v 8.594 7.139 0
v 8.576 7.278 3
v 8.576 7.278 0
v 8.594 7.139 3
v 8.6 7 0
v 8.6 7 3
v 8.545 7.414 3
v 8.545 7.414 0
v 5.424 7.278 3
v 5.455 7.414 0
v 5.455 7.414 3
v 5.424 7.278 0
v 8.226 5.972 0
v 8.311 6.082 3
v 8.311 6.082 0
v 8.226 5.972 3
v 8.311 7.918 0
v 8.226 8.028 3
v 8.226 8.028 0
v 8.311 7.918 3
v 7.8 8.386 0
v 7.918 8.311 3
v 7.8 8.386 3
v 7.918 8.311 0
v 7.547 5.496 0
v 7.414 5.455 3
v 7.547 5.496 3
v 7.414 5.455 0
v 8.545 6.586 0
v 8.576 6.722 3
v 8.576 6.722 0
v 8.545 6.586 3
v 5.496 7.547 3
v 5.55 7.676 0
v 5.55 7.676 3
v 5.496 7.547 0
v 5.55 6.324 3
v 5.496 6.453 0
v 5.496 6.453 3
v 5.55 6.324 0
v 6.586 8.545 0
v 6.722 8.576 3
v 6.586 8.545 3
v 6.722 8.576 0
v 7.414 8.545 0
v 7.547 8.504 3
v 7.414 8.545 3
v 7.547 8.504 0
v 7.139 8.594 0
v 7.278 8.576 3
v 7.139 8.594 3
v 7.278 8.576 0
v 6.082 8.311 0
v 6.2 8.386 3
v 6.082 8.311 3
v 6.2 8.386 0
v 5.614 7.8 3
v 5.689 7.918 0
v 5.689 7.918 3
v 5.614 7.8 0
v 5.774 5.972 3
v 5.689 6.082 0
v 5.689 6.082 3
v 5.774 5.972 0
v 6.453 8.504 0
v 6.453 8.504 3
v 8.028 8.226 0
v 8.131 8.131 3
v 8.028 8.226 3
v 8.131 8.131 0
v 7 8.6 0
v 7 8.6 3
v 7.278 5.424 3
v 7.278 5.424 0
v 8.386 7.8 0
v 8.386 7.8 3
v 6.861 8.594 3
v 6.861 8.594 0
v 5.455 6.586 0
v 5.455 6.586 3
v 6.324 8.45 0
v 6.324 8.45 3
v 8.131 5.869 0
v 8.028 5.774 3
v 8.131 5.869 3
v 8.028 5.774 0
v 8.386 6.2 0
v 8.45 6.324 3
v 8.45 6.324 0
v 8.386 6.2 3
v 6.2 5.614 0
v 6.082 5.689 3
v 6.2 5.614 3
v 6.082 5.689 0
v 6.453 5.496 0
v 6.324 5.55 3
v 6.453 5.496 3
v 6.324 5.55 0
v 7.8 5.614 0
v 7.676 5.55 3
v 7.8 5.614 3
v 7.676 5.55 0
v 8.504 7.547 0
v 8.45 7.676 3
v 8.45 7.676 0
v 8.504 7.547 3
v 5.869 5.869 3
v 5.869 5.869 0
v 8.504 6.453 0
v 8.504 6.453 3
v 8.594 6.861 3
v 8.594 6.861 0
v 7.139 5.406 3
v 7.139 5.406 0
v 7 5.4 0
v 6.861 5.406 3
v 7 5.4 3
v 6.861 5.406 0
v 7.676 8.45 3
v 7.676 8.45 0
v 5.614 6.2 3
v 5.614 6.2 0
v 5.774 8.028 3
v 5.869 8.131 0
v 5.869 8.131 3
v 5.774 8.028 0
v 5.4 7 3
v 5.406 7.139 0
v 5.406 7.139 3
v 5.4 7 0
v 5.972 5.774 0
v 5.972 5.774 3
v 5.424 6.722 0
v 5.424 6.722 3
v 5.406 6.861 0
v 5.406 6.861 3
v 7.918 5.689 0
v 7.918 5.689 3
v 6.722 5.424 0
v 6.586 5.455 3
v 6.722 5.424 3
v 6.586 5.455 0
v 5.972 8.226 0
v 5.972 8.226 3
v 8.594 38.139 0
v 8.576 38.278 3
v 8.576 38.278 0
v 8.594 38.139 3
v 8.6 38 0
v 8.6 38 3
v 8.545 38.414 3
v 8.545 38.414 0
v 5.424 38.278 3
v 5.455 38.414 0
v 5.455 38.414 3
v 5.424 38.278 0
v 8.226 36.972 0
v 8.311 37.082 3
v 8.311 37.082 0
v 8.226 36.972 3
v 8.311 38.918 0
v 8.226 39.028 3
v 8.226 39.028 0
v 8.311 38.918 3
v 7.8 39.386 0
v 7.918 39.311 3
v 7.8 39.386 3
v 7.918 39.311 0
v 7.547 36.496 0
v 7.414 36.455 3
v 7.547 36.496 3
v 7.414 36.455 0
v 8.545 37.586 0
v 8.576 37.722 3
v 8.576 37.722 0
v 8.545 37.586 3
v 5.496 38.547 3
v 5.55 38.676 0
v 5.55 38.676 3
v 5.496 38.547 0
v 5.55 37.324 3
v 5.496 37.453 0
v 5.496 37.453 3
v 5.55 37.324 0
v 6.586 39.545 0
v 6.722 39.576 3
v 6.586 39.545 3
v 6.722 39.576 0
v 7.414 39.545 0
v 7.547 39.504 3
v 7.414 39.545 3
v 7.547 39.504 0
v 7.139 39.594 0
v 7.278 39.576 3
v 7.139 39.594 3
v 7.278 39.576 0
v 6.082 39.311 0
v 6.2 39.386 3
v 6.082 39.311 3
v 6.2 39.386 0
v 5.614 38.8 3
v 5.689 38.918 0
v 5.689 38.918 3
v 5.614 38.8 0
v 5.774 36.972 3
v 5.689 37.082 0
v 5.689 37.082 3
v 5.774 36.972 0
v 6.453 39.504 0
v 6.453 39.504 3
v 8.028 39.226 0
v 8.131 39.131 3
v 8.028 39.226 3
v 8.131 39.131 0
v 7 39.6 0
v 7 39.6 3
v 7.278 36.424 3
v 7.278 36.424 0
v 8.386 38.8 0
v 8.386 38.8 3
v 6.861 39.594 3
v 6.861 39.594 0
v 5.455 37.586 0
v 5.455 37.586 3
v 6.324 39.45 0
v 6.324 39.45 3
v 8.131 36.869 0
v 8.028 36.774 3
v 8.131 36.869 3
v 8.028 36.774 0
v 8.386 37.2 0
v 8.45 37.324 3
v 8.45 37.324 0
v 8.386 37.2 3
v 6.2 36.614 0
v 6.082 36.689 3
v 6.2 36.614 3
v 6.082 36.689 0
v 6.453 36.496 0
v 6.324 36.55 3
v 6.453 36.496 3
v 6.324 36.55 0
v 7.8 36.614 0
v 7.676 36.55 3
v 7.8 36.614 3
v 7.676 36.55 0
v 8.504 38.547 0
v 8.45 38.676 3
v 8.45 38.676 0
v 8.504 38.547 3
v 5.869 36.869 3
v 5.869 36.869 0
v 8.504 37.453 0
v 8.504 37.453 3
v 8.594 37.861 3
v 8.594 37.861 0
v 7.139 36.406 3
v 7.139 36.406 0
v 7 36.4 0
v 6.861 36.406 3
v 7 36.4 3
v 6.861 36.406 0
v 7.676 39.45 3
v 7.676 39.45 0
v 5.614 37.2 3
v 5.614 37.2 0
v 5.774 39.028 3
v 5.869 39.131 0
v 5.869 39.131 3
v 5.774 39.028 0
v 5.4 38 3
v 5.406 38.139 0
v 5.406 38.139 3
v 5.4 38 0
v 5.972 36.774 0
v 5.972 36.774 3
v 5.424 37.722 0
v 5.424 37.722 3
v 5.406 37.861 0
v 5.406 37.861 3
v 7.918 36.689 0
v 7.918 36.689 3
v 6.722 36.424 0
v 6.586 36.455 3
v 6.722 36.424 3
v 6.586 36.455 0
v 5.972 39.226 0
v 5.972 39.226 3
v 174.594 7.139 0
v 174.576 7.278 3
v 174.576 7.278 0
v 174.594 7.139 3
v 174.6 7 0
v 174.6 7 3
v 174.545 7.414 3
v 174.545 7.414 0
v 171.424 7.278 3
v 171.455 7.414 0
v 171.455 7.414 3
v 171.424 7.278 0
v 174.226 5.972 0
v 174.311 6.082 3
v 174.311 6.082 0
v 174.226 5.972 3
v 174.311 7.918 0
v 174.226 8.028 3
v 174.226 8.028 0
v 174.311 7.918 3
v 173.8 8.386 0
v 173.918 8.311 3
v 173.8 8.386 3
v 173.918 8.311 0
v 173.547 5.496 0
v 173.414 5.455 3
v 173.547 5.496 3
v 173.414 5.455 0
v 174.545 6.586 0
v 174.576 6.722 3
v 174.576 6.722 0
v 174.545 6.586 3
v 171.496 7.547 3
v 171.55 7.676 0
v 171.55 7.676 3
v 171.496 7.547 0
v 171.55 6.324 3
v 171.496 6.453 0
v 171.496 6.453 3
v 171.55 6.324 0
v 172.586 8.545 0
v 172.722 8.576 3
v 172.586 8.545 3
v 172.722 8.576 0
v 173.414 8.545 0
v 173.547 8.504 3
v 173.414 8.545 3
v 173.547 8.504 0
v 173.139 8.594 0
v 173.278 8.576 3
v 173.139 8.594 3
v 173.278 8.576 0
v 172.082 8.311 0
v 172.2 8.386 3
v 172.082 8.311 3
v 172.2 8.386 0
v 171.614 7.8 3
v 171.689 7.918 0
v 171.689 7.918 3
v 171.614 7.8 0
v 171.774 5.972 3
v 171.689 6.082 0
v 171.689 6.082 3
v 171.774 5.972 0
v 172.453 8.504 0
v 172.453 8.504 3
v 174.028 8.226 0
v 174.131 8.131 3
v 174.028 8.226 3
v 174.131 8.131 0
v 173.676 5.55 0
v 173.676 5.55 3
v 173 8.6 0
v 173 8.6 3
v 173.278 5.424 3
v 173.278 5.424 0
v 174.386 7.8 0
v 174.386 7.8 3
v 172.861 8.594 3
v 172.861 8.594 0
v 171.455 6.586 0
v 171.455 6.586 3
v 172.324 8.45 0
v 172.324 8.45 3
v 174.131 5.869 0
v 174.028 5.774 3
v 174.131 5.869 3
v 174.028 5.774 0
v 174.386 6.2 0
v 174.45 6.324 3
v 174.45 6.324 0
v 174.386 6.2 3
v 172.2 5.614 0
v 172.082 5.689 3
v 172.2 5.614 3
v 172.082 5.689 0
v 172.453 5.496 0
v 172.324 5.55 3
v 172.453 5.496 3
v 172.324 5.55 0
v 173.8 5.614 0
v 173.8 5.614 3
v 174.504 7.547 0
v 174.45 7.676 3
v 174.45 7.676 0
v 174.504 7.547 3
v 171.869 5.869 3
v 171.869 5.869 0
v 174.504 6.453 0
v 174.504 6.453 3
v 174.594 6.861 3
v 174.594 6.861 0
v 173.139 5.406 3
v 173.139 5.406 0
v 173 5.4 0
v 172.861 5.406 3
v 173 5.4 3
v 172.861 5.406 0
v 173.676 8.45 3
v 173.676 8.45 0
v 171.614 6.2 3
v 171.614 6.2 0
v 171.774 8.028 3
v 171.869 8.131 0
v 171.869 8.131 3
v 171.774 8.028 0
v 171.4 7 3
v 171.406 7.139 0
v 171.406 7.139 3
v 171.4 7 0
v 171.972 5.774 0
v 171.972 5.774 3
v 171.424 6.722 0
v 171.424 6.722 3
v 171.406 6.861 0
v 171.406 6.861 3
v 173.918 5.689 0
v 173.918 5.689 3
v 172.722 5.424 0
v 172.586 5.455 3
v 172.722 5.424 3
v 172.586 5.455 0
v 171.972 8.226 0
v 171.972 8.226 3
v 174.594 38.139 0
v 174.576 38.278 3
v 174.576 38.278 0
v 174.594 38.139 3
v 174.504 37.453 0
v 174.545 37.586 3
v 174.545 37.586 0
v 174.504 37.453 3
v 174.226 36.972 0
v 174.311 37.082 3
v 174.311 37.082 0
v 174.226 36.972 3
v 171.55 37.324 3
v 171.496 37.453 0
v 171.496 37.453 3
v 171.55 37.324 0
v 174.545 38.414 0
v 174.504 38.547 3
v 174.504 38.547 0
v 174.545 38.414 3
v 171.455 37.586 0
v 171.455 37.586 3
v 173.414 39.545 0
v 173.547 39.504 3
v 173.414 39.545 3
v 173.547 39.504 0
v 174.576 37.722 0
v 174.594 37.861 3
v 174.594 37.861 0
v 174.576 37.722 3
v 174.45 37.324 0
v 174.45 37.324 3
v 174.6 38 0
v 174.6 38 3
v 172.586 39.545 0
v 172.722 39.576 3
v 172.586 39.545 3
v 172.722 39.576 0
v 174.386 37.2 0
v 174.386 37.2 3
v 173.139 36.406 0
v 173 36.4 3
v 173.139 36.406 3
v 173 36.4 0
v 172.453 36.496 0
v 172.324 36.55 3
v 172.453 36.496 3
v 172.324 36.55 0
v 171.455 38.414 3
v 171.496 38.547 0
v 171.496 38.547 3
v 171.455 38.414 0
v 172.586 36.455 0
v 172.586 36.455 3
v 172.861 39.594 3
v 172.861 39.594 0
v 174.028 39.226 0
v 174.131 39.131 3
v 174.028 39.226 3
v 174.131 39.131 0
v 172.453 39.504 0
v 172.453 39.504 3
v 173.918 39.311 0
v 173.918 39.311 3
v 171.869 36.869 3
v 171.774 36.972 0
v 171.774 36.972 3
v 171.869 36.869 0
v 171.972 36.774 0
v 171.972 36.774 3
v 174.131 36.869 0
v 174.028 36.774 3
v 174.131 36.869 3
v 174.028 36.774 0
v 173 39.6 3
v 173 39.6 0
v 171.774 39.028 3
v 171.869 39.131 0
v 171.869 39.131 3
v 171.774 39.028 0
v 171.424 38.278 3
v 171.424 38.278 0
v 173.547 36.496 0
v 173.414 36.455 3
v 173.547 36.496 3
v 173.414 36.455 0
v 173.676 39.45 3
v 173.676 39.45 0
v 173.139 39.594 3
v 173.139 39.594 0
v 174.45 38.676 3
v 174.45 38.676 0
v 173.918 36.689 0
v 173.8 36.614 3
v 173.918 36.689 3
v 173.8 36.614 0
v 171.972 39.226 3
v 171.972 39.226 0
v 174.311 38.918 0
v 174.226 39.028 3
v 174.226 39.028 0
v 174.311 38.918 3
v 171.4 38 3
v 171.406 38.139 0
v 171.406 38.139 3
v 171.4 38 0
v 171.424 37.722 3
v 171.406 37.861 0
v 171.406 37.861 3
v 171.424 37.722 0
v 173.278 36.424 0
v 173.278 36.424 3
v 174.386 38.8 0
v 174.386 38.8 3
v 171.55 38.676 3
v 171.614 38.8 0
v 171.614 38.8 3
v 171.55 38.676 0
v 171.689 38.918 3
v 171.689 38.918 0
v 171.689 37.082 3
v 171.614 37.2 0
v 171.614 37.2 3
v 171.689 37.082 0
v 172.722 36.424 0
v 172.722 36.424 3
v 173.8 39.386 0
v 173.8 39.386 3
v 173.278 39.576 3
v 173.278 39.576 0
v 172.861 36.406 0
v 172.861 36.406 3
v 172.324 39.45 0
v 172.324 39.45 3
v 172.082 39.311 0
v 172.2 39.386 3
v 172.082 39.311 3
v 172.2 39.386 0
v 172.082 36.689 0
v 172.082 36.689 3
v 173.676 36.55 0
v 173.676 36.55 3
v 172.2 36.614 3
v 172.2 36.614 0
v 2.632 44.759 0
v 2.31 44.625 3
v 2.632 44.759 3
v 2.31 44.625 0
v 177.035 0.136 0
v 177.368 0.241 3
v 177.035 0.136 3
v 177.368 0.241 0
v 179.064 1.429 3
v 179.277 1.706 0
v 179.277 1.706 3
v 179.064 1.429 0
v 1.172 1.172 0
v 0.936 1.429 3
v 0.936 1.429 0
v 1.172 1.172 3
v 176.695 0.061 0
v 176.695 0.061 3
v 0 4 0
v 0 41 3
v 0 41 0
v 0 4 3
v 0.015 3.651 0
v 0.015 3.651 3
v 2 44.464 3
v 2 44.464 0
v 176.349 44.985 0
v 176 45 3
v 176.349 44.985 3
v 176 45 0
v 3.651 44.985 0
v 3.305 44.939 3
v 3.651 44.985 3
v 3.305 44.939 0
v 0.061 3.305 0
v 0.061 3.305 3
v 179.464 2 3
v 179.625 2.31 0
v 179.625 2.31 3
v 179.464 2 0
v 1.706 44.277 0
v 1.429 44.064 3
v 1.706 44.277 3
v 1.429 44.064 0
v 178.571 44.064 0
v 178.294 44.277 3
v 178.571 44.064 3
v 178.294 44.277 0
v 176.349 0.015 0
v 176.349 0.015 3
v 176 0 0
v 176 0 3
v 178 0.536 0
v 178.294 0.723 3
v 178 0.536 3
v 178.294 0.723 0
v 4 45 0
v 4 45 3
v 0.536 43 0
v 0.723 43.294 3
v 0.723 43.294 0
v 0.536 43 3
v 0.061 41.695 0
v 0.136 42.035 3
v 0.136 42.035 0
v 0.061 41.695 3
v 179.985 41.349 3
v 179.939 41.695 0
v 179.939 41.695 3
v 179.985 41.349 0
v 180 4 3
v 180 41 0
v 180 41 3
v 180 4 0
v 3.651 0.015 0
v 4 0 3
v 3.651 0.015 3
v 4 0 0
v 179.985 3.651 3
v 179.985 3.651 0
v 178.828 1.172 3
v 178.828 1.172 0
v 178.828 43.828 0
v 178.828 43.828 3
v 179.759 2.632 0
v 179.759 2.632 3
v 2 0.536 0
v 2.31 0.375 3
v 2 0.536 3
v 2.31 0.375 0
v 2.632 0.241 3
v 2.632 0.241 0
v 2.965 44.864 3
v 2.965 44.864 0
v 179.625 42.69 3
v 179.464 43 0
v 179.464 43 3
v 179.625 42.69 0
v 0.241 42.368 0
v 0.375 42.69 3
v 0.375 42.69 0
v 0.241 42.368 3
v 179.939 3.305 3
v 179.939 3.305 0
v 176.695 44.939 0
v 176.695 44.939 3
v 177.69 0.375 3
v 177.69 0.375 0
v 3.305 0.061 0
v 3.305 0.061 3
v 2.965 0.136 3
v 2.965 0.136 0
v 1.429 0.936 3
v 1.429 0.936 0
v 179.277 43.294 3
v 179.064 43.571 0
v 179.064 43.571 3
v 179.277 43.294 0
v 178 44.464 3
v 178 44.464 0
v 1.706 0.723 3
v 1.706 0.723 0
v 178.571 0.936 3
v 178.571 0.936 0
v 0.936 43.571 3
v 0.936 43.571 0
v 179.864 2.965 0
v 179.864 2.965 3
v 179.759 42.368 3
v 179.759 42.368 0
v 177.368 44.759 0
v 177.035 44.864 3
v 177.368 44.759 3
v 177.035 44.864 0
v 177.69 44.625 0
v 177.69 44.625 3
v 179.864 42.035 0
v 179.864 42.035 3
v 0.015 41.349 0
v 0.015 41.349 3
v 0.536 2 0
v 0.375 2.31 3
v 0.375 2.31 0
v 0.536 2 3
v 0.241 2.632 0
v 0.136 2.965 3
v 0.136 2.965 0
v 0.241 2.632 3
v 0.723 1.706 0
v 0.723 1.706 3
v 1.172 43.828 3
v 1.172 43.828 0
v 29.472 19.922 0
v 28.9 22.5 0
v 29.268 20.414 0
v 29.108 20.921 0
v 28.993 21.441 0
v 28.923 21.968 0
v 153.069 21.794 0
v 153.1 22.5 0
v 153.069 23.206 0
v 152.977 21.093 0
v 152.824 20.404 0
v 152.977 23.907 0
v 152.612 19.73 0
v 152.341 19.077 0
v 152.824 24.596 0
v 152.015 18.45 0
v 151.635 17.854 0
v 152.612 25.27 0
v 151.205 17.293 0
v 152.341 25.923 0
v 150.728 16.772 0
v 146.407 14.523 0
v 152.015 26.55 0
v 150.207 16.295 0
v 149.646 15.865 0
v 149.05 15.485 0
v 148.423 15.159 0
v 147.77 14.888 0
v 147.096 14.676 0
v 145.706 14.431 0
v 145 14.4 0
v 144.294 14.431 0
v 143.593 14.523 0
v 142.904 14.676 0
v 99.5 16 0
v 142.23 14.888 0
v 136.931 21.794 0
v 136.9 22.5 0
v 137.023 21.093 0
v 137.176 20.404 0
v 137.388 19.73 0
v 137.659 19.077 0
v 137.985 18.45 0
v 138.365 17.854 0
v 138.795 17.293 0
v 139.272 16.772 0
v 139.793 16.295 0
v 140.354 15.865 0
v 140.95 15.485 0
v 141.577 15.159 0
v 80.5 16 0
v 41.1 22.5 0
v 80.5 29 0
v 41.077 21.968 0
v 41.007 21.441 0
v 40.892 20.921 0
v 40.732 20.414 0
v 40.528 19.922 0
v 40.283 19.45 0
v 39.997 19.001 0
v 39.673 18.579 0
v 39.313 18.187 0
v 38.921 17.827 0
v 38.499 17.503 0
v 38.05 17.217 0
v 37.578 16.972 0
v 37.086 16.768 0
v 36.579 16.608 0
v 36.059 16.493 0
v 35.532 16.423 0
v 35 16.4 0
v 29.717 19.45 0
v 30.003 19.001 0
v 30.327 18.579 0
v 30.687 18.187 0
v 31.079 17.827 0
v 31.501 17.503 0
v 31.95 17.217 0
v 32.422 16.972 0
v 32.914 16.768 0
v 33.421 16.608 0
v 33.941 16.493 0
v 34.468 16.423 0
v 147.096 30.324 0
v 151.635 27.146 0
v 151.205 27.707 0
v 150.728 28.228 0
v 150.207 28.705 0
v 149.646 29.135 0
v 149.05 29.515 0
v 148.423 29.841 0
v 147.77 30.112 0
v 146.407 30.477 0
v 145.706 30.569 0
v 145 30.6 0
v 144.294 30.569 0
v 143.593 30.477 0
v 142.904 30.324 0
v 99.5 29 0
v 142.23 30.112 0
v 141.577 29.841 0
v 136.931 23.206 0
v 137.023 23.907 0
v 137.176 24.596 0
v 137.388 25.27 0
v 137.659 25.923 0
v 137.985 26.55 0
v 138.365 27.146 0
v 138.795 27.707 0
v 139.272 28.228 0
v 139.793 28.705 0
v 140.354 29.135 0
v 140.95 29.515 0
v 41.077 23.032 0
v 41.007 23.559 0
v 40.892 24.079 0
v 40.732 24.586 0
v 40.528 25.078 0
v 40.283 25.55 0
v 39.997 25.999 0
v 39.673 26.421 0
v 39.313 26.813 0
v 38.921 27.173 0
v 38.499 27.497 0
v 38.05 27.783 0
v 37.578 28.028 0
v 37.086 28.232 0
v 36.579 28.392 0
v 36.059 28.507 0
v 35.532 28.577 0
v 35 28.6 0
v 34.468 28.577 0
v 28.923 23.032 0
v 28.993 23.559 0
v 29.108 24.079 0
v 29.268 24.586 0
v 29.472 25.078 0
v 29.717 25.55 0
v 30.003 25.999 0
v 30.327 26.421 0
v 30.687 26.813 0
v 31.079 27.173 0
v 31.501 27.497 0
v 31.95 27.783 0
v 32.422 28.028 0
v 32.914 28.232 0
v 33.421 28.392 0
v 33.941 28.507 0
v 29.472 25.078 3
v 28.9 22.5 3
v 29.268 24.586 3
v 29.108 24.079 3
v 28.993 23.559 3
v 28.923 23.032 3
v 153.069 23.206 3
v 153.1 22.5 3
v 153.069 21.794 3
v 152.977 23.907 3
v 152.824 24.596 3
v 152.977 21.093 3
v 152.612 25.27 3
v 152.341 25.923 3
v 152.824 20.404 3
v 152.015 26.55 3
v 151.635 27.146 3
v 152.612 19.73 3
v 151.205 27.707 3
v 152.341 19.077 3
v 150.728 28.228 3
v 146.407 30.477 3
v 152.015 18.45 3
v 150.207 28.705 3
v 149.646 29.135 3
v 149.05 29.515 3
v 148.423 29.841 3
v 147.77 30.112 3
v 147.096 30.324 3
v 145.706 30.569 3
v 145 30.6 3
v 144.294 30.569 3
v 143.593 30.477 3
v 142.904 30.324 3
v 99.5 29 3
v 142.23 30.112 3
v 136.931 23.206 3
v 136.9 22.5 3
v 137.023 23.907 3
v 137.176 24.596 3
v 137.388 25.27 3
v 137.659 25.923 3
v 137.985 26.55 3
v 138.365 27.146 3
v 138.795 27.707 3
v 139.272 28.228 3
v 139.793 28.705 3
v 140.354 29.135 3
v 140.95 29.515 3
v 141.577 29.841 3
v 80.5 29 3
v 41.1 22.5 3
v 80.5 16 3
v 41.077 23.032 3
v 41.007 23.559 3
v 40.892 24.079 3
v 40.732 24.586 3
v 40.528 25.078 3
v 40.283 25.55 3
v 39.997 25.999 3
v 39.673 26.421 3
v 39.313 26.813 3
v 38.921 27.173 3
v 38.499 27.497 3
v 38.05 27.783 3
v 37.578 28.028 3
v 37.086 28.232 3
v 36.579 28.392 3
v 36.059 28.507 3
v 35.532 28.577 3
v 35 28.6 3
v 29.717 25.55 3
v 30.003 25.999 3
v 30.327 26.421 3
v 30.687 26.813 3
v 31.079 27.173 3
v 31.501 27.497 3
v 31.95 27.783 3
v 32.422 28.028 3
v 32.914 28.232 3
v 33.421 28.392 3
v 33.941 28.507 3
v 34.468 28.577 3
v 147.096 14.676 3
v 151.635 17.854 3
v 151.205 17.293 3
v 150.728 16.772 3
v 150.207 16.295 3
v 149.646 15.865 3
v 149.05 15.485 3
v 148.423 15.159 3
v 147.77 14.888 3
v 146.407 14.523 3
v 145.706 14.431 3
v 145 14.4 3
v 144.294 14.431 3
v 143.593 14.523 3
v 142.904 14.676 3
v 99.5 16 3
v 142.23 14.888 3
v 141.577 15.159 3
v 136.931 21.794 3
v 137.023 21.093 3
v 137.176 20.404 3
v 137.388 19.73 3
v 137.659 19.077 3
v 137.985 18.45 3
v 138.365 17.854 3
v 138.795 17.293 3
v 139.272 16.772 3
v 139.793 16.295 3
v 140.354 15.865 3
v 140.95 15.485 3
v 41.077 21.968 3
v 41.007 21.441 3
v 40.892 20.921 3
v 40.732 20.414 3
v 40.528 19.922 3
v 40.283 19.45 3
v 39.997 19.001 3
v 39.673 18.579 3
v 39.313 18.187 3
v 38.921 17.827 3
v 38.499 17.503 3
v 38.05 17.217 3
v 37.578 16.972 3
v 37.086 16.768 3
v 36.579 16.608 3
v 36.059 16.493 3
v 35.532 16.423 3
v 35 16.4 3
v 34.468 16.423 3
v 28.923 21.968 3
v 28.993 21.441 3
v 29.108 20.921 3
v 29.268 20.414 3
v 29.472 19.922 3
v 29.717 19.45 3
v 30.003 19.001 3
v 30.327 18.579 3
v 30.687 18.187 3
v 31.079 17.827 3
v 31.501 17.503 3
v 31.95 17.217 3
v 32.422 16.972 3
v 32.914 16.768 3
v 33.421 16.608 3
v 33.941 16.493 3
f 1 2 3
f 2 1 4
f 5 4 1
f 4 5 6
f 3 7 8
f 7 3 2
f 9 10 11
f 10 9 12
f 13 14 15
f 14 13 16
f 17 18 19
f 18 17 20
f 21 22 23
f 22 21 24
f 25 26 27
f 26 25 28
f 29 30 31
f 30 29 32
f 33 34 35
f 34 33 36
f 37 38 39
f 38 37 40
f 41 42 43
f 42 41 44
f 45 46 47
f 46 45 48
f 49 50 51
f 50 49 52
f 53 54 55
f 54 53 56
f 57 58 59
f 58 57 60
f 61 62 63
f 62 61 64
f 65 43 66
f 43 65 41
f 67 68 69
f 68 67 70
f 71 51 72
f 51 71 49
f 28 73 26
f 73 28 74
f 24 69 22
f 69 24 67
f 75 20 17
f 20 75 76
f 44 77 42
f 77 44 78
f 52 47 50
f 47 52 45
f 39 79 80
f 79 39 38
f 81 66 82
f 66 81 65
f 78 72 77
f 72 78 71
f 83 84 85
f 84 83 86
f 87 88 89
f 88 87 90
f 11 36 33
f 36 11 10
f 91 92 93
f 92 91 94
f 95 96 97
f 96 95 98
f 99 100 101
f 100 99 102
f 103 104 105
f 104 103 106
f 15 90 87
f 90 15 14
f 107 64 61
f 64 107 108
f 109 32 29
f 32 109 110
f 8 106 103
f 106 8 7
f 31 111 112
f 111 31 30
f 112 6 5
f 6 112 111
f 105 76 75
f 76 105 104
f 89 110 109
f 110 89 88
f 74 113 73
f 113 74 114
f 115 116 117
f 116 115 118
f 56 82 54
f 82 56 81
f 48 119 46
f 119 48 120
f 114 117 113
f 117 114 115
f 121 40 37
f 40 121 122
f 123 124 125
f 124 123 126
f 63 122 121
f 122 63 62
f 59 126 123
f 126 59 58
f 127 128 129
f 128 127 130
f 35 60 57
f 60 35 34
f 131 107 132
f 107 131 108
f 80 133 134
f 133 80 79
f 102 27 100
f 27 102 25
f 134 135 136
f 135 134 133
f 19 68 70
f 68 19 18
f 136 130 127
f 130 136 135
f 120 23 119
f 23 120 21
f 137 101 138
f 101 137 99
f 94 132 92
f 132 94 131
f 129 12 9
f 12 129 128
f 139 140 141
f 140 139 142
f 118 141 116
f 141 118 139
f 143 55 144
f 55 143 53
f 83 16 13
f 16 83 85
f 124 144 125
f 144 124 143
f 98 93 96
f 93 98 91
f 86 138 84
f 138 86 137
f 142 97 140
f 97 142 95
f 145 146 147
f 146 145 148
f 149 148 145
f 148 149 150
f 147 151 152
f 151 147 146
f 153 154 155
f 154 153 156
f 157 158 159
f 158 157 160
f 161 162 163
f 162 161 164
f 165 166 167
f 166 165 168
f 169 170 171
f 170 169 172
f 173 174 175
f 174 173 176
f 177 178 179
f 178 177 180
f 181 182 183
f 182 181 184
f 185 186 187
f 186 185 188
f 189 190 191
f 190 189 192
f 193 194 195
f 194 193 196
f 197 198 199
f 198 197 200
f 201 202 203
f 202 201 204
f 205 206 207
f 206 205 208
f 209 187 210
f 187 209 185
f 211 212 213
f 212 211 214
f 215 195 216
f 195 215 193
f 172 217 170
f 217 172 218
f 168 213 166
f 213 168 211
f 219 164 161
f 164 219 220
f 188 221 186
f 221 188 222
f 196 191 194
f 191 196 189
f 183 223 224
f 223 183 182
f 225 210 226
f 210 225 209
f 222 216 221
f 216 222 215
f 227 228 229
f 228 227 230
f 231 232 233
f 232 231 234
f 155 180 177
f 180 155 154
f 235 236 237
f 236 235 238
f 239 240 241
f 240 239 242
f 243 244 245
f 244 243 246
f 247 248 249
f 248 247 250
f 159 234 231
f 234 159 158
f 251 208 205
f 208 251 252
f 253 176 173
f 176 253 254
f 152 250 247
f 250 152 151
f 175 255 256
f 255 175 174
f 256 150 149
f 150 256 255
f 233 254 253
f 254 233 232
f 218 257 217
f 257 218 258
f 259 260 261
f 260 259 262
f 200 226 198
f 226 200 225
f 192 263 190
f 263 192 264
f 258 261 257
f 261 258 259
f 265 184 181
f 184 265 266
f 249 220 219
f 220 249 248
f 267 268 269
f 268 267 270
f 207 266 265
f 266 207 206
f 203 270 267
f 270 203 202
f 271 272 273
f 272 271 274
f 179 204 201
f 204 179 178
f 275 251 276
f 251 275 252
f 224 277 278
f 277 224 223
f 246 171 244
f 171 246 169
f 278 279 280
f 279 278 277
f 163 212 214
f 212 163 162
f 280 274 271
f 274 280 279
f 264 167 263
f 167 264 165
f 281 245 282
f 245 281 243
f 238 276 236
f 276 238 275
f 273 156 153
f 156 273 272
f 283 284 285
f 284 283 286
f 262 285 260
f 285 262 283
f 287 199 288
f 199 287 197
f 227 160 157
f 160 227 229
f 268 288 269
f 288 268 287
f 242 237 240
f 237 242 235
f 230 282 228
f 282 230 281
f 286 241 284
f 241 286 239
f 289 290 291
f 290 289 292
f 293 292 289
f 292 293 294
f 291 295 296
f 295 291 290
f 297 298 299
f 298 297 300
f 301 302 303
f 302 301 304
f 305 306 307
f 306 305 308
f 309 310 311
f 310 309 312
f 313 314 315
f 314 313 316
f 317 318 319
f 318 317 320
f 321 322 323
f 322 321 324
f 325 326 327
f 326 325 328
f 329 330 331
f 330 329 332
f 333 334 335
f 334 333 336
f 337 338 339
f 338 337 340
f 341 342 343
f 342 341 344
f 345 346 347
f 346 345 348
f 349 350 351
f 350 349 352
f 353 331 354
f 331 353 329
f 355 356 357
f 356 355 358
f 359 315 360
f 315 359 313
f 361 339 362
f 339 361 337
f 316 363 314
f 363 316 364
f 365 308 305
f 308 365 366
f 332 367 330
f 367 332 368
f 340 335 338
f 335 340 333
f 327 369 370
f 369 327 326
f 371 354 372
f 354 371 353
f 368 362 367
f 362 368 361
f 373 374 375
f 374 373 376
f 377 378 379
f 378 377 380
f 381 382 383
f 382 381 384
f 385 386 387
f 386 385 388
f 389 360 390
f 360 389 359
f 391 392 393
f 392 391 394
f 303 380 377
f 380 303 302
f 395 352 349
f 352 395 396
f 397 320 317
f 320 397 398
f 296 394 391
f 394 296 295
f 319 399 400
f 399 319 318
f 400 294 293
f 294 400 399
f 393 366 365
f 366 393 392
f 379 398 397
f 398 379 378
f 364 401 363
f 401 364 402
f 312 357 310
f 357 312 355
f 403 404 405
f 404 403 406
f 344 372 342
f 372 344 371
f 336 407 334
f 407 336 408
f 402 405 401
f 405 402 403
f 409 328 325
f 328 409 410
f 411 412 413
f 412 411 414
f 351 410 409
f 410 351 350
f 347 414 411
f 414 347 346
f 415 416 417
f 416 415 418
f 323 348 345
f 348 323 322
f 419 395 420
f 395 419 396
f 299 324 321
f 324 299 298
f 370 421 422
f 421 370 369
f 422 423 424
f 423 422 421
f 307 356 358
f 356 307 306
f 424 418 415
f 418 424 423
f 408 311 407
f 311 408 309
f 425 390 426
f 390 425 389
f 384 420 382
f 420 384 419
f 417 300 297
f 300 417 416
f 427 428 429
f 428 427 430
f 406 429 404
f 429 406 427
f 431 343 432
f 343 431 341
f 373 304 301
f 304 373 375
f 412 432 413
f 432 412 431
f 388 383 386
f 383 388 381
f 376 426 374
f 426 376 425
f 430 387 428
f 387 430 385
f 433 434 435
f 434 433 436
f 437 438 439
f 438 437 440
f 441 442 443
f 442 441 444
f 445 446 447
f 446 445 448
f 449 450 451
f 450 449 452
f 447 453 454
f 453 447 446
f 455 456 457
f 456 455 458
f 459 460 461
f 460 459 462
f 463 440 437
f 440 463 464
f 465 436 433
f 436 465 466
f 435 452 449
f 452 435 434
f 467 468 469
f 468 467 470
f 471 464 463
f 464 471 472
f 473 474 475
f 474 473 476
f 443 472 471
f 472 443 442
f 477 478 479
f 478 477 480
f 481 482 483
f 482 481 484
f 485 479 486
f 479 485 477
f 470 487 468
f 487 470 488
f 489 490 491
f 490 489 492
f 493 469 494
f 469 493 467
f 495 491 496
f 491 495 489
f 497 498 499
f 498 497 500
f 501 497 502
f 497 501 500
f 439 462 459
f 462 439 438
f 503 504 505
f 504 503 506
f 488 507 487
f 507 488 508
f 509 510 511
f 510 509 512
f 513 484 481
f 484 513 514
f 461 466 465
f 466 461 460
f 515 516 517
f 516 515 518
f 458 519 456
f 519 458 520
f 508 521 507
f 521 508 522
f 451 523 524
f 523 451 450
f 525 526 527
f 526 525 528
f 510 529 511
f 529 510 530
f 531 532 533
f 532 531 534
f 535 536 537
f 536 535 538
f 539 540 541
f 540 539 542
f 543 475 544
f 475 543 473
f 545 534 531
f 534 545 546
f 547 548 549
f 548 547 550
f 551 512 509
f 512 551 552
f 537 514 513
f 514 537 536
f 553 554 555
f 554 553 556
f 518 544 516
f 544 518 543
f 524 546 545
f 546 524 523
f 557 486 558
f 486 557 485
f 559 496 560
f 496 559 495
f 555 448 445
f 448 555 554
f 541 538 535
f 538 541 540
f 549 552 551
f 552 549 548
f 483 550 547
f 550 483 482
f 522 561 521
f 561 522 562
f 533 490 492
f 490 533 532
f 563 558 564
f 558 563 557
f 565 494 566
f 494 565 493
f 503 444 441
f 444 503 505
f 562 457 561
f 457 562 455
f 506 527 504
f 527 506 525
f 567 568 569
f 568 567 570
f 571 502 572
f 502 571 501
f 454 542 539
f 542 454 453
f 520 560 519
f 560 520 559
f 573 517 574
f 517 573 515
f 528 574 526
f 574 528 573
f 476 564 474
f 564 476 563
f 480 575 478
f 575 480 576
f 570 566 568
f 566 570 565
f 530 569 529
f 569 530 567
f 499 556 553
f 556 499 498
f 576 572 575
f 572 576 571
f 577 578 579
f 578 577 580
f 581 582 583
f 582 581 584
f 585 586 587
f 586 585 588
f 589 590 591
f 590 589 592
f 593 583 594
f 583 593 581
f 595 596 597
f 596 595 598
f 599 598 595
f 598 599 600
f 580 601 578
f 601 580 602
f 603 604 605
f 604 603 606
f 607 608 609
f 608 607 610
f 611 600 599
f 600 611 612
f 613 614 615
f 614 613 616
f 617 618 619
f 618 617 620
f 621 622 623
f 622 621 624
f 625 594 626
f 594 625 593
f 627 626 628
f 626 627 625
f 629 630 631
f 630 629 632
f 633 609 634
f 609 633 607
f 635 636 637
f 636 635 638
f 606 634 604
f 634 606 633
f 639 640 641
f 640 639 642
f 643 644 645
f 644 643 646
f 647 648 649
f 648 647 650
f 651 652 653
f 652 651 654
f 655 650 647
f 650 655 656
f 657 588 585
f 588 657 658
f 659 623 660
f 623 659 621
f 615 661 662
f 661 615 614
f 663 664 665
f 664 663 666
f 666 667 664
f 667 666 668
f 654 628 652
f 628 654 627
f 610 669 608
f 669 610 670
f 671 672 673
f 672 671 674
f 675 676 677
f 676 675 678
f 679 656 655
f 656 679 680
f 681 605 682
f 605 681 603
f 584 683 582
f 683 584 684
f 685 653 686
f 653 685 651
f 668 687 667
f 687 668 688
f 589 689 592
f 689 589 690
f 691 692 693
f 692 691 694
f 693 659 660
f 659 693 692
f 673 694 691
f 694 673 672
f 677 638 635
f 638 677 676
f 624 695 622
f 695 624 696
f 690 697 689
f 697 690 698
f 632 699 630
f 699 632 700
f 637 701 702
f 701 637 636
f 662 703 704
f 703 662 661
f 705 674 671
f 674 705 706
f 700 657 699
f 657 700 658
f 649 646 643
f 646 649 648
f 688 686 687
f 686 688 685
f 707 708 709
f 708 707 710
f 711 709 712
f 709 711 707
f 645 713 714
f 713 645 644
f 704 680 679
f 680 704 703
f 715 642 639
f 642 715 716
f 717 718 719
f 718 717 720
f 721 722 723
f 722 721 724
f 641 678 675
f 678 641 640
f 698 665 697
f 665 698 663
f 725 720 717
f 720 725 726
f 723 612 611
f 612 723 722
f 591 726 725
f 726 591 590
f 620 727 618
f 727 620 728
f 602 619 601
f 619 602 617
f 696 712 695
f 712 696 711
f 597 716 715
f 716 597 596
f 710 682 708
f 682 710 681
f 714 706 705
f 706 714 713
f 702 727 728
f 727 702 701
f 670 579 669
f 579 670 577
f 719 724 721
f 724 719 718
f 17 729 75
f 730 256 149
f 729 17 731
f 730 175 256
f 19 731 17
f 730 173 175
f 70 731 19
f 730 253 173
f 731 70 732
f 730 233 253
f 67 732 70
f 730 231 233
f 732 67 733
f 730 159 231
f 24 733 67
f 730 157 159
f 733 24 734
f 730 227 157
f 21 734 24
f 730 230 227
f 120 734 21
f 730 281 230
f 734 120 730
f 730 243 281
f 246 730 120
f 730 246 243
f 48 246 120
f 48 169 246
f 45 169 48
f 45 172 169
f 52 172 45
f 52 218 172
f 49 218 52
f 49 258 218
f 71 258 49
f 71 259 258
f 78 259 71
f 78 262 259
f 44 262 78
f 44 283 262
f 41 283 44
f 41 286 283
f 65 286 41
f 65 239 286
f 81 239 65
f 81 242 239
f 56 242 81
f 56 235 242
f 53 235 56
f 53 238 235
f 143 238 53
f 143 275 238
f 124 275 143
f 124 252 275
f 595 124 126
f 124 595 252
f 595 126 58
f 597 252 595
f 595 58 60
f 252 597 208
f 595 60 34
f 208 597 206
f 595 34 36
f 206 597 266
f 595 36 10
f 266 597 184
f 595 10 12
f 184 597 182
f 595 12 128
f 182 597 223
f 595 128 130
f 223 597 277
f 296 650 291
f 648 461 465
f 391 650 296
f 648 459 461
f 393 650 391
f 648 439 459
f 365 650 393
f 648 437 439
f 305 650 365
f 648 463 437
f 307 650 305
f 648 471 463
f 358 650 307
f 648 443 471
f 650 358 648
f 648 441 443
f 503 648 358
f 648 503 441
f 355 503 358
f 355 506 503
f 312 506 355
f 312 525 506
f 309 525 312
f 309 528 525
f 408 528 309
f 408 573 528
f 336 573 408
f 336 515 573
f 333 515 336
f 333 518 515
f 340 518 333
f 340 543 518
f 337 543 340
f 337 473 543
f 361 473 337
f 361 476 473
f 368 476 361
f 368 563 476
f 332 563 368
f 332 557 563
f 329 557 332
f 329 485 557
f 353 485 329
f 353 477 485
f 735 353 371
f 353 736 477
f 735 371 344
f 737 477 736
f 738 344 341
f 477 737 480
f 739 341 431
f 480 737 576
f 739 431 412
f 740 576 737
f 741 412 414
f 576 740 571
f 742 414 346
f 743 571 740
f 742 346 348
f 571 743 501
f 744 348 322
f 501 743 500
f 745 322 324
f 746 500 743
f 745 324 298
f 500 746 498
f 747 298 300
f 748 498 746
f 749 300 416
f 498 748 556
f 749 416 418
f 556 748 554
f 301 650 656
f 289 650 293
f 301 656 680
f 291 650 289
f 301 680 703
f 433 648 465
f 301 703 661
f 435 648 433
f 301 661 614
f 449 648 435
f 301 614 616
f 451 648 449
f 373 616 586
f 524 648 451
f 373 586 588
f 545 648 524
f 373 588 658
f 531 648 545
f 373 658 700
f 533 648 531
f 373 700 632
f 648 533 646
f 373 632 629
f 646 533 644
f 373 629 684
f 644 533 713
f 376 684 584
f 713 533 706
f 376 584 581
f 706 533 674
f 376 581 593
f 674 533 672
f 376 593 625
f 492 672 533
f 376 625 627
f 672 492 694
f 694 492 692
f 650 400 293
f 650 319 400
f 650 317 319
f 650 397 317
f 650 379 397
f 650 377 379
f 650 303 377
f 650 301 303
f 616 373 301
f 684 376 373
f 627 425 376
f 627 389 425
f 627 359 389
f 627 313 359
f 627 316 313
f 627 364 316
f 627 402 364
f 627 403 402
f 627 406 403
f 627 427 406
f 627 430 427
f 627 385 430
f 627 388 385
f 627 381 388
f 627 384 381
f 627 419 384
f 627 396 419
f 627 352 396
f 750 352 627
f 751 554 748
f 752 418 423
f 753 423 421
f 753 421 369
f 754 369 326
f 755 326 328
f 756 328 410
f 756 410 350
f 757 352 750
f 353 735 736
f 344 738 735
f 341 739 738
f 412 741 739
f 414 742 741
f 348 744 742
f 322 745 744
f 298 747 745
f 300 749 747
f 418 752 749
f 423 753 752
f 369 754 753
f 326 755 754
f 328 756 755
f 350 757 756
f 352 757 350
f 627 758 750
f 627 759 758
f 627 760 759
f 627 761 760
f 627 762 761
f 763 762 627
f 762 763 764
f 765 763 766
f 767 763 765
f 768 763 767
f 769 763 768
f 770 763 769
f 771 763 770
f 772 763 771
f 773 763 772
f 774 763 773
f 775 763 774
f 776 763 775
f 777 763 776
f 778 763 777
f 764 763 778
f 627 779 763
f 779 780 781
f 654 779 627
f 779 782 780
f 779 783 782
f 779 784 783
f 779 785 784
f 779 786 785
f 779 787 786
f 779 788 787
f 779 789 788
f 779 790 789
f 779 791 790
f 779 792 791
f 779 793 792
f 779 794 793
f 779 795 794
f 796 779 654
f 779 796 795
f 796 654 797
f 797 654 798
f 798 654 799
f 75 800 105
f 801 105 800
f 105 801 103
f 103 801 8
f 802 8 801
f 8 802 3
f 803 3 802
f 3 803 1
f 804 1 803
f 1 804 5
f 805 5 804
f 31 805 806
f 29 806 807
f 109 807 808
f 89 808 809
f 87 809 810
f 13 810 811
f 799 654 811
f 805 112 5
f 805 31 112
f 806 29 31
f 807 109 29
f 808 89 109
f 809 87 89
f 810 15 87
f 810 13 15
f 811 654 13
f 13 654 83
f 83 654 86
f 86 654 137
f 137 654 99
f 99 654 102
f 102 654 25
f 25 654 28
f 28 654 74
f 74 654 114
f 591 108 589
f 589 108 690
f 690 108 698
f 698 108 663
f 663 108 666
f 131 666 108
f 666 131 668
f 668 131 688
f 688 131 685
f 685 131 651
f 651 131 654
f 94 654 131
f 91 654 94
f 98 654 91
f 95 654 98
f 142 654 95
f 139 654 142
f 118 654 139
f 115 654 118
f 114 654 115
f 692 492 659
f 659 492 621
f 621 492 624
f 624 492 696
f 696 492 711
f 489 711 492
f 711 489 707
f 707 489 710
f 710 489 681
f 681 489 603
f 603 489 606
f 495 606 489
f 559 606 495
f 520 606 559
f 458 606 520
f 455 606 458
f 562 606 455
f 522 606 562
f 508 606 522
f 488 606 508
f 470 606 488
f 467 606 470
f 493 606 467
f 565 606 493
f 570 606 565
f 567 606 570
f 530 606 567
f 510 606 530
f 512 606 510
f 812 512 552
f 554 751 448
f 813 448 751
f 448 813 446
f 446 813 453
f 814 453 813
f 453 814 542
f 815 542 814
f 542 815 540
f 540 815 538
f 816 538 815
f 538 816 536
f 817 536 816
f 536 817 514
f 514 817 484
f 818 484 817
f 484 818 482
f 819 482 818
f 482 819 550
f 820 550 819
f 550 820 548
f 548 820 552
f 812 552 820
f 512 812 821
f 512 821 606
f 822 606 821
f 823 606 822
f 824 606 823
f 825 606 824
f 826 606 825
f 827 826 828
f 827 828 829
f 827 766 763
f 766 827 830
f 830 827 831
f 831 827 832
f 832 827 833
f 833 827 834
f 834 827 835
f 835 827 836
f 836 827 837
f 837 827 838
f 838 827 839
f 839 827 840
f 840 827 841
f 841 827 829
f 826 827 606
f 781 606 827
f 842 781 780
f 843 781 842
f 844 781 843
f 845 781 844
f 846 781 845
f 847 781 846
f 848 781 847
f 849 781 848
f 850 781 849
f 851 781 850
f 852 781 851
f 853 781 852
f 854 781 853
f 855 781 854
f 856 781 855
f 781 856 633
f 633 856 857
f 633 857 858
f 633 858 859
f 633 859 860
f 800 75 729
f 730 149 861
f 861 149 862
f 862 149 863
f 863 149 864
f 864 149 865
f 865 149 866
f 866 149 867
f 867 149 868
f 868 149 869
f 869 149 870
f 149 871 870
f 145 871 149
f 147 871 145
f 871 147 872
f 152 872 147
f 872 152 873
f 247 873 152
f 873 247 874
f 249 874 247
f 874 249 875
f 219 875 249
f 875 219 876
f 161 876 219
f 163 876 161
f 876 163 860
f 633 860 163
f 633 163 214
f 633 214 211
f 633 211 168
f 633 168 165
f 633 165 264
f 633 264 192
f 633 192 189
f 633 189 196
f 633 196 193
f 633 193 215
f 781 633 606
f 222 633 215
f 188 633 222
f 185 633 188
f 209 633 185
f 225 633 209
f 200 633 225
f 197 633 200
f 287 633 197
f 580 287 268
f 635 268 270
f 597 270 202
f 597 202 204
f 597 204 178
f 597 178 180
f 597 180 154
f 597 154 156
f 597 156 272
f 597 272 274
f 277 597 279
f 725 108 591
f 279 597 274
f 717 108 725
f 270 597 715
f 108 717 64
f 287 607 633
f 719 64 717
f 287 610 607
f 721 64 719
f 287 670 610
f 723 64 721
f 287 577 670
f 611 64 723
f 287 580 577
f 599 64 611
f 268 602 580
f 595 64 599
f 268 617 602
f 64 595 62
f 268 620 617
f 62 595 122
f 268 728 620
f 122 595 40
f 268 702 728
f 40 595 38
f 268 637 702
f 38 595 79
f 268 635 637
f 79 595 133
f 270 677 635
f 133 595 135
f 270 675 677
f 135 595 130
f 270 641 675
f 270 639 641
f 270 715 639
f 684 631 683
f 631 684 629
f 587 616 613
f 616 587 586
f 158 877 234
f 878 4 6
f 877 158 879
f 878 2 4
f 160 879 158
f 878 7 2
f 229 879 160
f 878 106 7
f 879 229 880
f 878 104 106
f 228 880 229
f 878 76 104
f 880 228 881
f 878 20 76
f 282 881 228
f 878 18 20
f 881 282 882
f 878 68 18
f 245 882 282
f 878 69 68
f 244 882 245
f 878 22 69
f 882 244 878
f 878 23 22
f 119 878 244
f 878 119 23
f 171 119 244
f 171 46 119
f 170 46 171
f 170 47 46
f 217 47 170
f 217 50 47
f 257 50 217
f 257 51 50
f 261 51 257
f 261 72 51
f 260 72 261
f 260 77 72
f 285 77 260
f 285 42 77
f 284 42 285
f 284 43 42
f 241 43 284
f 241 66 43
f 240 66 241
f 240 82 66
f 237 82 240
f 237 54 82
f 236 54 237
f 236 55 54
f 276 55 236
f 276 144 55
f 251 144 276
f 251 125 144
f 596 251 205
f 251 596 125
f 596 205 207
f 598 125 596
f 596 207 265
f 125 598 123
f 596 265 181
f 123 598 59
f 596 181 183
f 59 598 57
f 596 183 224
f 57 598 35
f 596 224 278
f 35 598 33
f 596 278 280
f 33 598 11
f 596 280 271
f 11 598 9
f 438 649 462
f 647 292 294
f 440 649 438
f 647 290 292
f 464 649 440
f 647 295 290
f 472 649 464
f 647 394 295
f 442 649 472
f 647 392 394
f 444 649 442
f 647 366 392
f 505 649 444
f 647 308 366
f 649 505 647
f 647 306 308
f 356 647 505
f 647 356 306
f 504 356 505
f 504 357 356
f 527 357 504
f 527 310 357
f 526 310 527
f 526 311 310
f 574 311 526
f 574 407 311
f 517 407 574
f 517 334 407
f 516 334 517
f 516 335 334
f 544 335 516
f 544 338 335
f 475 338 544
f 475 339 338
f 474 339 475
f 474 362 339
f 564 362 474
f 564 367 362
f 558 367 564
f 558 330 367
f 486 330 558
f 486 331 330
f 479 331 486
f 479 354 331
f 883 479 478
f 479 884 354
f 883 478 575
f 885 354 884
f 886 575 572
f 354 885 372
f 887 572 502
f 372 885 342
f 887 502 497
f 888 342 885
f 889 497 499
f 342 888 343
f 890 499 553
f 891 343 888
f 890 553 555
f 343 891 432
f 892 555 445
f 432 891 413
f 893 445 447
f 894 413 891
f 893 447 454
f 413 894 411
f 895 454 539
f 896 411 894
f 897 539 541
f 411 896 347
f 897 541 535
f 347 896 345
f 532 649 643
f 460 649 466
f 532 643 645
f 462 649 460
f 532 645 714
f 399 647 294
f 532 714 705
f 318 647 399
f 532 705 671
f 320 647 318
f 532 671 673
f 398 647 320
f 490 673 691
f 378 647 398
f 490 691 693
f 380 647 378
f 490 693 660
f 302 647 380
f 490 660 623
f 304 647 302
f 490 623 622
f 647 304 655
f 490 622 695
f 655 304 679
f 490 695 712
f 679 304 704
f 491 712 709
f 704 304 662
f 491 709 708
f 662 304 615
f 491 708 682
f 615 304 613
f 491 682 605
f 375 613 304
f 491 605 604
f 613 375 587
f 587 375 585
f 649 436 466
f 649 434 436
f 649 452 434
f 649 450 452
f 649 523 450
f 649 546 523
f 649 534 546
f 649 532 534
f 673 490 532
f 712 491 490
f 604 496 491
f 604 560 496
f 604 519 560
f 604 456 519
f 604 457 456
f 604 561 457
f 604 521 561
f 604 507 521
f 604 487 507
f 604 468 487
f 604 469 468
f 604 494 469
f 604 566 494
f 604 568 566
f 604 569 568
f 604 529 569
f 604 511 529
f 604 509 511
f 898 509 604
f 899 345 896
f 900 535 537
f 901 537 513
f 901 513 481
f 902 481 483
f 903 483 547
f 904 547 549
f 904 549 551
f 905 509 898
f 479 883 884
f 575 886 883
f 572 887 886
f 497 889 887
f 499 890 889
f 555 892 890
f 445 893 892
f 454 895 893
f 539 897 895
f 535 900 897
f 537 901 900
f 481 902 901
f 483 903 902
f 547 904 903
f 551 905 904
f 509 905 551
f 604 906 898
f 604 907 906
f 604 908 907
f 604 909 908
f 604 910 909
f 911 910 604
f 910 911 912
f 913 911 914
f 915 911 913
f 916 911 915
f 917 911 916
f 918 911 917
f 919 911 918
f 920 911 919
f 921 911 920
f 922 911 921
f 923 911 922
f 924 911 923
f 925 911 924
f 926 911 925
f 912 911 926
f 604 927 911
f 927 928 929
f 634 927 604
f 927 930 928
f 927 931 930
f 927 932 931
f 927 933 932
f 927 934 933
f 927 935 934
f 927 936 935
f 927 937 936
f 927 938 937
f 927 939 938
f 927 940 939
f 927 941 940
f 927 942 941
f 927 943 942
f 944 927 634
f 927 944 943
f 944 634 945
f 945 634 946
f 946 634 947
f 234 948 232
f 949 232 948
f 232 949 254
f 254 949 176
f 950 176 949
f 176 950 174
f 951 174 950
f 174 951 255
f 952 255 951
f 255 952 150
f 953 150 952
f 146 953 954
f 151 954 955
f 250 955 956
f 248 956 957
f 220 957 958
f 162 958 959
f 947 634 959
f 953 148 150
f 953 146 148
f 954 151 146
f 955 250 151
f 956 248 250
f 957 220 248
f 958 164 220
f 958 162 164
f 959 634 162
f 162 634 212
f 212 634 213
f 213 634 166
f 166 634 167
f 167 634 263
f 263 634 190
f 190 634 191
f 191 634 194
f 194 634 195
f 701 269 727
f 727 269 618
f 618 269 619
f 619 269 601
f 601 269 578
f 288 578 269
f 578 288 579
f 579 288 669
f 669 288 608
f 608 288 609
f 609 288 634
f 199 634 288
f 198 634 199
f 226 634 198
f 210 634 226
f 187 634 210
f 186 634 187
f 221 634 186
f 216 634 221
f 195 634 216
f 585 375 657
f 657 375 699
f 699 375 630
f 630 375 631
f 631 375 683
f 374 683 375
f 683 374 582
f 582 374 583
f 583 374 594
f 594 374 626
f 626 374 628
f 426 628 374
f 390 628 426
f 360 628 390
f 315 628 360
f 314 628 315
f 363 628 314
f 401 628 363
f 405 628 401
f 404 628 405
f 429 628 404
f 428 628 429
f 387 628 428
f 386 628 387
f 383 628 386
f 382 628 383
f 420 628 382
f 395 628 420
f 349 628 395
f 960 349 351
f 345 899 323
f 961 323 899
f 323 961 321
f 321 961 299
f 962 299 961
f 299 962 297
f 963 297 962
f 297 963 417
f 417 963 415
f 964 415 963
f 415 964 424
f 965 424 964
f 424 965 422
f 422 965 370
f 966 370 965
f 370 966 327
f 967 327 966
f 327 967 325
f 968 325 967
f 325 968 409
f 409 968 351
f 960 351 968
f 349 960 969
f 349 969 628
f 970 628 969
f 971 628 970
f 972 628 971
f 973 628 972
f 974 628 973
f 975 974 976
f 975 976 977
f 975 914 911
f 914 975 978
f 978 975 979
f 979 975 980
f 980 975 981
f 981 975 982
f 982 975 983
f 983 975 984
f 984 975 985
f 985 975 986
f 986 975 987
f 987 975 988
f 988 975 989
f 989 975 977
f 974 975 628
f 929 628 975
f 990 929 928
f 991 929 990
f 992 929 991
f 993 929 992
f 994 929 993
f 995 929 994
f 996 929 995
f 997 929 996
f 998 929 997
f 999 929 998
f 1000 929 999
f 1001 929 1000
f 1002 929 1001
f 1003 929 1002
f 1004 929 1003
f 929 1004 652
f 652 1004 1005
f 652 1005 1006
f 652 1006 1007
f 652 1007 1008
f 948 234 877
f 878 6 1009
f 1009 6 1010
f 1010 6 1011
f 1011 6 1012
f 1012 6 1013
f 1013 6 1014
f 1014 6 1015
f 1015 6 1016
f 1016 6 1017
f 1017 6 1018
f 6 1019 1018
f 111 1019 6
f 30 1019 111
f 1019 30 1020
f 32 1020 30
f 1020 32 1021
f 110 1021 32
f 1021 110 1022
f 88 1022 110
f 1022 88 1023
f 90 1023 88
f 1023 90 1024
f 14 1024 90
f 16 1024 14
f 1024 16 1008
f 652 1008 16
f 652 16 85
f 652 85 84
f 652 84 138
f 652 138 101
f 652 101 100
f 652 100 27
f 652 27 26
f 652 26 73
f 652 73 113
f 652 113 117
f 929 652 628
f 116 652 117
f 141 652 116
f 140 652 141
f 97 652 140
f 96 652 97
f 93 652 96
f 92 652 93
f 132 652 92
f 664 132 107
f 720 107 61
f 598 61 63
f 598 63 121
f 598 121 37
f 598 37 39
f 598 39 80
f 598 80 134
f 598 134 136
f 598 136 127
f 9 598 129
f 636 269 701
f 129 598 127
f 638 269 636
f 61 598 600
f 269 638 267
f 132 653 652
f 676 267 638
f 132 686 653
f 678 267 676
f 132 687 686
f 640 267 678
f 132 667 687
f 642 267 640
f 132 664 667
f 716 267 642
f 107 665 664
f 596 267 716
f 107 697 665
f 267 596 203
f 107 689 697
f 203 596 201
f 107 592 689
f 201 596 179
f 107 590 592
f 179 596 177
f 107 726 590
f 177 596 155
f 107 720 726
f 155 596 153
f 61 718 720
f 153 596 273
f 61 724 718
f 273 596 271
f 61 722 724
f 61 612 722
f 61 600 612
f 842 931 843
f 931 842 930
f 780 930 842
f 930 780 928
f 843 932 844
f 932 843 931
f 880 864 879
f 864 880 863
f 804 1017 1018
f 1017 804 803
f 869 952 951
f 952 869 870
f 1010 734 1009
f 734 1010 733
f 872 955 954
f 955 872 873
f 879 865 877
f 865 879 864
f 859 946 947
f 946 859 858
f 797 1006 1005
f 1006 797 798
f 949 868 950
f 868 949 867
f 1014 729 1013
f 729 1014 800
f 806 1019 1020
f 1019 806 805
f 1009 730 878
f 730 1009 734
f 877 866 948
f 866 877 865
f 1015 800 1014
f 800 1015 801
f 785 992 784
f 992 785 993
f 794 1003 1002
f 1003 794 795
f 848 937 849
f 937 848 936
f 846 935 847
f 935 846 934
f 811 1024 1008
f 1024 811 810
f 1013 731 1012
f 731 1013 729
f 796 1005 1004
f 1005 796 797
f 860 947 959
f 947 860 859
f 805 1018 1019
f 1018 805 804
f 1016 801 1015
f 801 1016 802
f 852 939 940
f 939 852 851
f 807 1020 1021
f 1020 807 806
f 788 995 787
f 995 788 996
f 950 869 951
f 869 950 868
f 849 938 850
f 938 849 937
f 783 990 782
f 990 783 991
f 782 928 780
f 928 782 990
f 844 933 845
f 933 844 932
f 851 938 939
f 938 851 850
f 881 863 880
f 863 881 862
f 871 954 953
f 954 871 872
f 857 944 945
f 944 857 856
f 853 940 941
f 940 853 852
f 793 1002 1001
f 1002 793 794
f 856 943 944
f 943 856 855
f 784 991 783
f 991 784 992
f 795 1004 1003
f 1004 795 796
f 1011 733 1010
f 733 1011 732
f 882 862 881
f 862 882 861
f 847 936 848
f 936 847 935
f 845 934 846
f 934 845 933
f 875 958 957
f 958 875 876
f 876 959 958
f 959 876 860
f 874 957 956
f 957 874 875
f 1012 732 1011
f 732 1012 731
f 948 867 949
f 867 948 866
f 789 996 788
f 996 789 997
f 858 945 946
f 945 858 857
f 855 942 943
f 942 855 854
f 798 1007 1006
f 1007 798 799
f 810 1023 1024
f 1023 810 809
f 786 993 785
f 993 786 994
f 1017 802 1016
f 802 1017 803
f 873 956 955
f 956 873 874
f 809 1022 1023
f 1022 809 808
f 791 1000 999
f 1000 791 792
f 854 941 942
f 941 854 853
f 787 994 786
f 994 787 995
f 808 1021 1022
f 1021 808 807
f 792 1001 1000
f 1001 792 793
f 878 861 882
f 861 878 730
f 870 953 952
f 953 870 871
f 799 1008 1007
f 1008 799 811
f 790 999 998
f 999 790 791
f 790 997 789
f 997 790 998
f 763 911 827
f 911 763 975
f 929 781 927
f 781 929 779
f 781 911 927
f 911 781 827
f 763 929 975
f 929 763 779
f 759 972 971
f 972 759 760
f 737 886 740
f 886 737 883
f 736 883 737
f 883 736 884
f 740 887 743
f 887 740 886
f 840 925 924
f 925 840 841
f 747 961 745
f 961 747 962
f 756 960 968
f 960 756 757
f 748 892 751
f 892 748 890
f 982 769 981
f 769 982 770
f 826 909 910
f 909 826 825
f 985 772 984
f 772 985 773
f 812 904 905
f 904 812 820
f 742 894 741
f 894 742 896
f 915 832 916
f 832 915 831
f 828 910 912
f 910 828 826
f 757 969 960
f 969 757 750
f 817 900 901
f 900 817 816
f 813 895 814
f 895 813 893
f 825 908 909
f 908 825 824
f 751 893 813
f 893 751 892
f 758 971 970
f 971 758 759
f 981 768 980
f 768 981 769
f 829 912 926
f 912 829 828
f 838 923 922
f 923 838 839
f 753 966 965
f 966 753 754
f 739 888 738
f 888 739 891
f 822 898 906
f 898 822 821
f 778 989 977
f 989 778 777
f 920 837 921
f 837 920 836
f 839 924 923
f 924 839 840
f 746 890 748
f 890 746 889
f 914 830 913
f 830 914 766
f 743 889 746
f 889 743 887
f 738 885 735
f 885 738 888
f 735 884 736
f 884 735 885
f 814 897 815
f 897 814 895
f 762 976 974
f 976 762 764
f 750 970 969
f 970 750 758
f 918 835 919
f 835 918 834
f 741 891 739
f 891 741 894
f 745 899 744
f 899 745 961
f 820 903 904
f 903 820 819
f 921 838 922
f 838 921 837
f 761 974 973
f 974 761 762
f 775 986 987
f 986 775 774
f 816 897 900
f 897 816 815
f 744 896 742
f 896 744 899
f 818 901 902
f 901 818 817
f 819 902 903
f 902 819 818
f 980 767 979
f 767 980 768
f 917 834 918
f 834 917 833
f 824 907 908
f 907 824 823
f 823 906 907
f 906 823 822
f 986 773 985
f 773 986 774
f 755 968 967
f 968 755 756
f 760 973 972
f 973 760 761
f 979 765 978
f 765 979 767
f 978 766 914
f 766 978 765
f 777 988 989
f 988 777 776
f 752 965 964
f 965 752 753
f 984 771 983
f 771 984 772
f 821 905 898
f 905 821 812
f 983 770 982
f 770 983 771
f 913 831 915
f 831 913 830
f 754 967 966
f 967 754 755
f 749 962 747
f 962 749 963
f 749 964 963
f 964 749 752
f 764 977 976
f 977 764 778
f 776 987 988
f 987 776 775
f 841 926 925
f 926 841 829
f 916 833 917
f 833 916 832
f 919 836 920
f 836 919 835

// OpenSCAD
// Doomsday Cyberdeck switch faceplate — REV A prototype
// Units mm. Assumed cutouts only; check selected switch datasheets before final print.
$fn=72;
panel_w=180; panel_h=45; panel_t=3; corner_r=4; mount_d=3.2;
module rounded_plate_2d(w,h,r){ offset(r=r) offset(delta=-r) square([w,h]); }
difference(){
  linear_extrude(height=panel_t) rounded_plate_2d(panel_w,panel_h,corner_r);
  for(x=[7,panel_w-7],y=[7,panel_h-7]) translate([x,y,-0.1]) cylinder(d=mount_d,h=panel_t+0.2);
  // Guarded toggle assumed 12.2 mm hole
  translate([35,22.5,-0.1]) cylinder(d=12.2,h=panel_t+0.2);
  // Rocker assumed 19 x 13 mm rectangle
  translate([90-19/2,22.5-13/2,-0.1]) cube([19,13,panel_t+0.2]);
  // Momentary pushbutton assumed 16.2 mm hole
  translate([145,22.5,-0.1]) cylinder(d=16.2,h=panel_t+0.2);
}
